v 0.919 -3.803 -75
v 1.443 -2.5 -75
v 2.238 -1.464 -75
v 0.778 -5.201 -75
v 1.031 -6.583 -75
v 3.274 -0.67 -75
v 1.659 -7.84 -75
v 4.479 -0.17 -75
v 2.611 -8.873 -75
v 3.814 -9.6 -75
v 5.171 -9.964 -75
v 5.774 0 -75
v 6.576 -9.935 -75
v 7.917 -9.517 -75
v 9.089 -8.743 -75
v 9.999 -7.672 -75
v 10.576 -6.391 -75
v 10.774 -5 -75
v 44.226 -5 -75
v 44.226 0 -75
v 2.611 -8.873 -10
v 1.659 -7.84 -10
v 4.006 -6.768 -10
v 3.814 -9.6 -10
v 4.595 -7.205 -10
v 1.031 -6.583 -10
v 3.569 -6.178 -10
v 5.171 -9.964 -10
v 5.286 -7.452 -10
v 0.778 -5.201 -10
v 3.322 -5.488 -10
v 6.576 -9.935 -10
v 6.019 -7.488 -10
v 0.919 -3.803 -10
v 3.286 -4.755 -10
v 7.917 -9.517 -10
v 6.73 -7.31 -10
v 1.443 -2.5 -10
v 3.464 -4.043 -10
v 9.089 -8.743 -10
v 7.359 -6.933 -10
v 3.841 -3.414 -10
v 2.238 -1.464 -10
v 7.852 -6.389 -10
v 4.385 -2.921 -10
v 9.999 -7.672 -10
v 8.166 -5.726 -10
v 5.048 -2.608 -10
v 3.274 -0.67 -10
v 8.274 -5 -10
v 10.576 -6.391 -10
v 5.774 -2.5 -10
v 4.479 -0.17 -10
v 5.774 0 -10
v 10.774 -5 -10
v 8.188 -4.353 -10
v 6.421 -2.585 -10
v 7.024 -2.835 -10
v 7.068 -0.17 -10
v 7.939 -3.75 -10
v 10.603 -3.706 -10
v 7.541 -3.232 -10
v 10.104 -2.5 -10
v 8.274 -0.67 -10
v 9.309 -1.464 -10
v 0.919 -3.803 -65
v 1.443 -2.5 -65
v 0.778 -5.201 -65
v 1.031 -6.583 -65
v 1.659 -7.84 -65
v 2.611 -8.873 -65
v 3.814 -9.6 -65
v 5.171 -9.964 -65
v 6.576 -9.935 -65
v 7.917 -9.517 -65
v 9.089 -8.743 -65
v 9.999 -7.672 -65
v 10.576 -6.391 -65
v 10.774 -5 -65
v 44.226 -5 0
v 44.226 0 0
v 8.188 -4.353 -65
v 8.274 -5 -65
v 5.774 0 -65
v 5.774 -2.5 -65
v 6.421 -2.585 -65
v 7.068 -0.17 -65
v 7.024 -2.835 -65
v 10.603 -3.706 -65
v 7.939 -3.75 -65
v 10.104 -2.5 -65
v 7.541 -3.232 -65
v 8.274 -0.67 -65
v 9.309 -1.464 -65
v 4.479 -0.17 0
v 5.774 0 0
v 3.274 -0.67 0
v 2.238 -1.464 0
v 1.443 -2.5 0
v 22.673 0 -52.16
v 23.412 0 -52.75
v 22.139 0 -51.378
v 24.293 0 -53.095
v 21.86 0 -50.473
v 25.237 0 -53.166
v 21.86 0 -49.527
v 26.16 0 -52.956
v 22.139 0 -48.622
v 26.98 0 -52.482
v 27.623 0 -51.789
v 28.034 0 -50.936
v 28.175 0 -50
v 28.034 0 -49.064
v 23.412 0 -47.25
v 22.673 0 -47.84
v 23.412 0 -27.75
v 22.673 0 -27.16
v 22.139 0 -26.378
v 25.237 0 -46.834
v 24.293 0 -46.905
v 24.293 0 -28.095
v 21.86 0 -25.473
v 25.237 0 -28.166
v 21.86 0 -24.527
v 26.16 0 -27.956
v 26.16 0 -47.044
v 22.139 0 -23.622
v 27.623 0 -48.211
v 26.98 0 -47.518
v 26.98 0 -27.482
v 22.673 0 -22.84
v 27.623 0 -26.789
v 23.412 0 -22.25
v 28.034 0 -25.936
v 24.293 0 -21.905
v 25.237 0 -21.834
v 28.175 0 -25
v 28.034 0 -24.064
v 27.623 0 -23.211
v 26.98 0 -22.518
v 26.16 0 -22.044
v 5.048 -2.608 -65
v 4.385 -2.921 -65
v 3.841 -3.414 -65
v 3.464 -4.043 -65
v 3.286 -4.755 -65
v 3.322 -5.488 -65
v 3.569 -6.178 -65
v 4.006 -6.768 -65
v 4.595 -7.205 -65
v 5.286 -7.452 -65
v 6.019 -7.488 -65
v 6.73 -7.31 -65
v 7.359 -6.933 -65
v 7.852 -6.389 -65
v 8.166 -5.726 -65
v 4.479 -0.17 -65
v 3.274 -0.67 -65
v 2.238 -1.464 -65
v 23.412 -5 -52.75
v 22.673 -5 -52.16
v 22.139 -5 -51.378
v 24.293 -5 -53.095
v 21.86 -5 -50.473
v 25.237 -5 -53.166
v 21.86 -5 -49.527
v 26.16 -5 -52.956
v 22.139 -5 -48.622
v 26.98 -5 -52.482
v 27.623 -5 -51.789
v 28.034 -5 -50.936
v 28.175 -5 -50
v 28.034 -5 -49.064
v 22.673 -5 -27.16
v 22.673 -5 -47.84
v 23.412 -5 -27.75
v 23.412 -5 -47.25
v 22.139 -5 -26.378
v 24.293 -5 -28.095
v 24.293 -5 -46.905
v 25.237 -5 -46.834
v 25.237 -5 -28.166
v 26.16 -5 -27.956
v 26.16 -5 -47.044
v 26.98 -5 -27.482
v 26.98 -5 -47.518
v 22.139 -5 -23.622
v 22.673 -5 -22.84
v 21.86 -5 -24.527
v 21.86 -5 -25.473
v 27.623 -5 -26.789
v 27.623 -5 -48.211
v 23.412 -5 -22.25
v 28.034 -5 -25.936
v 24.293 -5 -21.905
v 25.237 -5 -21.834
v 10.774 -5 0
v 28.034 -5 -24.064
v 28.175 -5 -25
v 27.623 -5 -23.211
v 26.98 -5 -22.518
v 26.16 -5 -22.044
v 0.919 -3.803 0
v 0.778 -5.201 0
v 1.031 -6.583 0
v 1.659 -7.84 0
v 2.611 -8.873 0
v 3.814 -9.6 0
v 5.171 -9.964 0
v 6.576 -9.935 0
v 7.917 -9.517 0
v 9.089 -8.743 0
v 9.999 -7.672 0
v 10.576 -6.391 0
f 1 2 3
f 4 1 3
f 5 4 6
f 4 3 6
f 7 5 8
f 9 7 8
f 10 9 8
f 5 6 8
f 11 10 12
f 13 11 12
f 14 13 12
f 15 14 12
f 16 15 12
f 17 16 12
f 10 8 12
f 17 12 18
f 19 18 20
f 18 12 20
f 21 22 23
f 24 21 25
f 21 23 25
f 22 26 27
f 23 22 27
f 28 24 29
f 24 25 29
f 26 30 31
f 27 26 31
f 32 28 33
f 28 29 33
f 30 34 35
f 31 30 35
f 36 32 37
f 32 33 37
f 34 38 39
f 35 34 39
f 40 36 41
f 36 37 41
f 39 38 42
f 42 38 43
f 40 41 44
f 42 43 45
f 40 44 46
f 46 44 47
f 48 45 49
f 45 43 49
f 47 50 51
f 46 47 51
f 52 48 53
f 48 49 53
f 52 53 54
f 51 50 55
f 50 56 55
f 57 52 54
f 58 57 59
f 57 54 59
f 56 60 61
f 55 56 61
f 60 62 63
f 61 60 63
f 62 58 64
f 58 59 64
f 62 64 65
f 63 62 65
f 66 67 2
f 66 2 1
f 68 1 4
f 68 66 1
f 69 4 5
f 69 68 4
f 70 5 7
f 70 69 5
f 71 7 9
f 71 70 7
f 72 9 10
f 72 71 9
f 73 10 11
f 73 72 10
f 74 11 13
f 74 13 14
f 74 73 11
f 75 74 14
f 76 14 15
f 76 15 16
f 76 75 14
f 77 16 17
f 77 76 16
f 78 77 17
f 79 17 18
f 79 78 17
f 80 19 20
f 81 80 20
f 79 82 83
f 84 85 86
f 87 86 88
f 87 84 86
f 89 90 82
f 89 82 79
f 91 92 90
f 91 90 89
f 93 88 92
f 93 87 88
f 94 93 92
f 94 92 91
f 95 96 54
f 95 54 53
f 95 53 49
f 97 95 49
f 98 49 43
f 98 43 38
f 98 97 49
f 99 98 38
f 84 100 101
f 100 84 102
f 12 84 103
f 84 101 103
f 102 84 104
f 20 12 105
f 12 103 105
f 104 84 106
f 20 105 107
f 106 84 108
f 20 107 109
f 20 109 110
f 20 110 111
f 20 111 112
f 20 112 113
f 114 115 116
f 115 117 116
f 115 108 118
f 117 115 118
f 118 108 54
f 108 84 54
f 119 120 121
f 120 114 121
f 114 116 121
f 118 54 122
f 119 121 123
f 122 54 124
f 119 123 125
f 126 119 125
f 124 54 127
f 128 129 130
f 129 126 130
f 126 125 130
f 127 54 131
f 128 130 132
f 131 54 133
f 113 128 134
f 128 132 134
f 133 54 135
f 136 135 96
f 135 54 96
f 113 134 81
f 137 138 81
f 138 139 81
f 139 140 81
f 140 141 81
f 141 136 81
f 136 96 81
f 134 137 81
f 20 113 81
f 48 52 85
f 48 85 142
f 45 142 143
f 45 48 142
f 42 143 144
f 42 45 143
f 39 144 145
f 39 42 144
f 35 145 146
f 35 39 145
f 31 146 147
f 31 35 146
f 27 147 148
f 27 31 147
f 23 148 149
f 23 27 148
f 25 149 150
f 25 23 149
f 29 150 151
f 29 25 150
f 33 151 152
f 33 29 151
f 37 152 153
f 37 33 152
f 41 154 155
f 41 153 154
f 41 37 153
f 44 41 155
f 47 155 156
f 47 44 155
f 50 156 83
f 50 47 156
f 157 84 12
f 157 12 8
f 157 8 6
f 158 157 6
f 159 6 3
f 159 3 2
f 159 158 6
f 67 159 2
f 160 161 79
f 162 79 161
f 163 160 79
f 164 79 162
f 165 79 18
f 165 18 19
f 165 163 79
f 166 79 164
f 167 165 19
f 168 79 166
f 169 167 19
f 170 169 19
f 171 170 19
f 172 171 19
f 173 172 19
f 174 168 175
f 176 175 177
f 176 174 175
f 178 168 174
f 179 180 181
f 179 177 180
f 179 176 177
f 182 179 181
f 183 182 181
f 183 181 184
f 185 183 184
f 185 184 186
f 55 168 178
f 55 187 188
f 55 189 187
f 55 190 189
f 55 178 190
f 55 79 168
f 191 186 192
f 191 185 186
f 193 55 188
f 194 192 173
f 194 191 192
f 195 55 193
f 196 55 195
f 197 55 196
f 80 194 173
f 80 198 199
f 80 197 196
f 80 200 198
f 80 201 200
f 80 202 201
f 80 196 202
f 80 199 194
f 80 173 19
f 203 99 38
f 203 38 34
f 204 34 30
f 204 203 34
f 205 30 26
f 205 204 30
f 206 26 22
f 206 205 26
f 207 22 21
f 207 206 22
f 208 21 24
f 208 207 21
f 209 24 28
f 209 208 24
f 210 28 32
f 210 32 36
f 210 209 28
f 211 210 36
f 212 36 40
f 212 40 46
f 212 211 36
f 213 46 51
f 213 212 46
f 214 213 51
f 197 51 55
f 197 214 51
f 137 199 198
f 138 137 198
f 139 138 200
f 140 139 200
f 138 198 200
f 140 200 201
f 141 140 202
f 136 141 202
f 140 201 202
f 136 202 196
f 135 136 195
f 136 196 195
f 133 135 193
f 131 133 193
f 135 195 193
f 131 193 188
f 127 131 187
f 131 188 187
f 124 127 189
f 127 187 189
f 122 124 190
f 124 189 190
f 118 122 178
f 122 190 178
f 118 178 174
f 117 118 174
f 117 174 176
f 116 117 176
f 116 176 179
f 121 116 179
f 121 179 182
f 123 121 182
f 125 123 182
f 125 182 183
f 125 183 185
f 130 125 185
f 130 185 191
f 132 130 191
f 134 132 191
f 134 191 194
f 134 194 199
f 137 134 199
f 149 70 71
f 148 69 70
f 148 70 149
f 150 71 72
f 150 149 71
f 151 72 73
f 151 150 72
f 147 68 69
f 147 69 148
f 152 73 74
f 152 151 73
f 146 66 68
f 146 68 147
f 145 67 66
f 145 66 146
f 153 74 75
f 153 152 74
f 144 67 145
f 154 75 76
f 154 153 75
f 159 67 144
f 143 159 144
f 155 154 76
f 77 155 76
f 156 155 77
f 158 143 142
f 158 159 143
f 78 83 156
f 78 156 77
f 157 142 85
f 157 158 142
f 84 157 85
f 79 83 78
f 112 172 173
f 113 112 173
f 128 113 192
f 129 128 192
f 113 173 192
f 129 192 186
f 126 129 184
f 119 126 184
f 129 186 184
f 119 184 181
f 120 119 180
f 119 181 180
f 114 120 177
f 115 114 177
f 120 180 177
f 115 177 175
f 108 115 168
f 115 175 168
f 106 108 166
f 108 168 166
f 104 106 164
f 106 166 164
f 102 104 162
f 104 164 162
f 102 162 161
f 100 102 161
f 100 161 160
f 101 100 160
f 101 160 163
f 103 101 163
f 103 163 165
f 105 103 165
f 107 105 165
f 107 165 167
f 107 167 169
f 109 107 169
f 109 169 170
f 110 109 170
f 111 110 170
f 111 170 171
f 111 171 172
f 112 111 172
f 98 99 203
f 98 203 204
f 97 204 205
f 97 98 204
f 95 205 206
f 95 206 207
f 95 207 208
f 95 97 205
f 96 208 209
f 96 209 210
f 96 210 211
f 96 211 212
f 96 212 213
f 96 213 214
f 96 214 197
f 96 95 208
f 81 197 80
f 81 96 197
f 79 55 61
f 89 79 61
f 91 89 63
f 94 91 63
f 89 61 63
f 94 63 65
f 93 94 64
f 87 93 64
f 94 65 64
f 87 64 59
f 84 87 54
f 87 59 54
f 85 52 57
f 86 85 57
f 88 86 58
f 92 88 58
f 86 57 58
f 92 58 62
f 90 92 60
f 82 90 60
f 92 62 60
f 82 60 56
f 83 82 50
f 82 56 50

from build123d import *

# Parameters (mm, degrees)
SKETCH1_W           = 38.452994616
SKETCH1_H           = 5
BOSS_EXTRUDE1_DEPTH = 75
BOSS_EXTRUDE2_DEPTH = 10
BOSS_EXTRUDE4_DEPTH = 75
BOSS_EXTRUDE5_START = -65
BOSS_EXTRUDE5_DEPTH = 10
CUT_EXTRUDE7_START  = -10
CUT_EXTRUDE7_DEPTH  = 55
SKETCH5_R           = 3.175
CUT_EXTRUDE8_DEPTH  = 55


with BuildPart() as part:
    # Sketch1 → Boss-Extrude1 (new body)
    with BuildSketch(Plane.XY):
        with Locations((25, -2.5)):
            Rectangle(SKETCH1_W, SKETCH1_H)
    extrude(amount=-BOSS_EXTRUDE1_DEPTH)

    # Sketch1<4> → Boss-Extrude2 (add)
    with BuildSketch(Plane.XY):
        with BuildLine():
            ThreePointArc((5.773502692, 0), (2.237968786, -8.535533906), (10.773502692, -5))
            Line((10.773502692, -5), (5.773502692, -5))
            Line((5.773502692, -5), (5.773502692, 0))
        make_face()
    extrude(amount=-BOSS_EXTRUDE2_DEPTH)

    # Sketch1<11> → Boss-Extrude4 (add)
    with BuildSketch(Plane.XY):
        with BuildLine():
            Line((5.773502692, -5), (5.773502692, -2.5))
            ThreePointArc((5.773502692, -2.5), (4.005735739, -6.767766953), (8.273502692, -5))
            Line((8.273502692, -5), (5.773502692, -5))
        make_face()
    extrude(amount=-BOSS_EXTRUDE4_DEPTH)

    # Sketch1<12> → Boss-Extrude5 (add)
    with BuildSketch(Plane.XY.offset(BOSS_EXTRUDE5_START)):
        with BuildLine():
            Line((5.773502692, -2.5), (5.773502692, 0))
            ThreePointArc((5.773502692, 0), (3.273502704, -0.669872974), (1.443375686, -2.499999977))
            ThreePointArc((1.443375686, -2.499999977), (4.479407453, -9.829629128), (10.773502692, -5))
            Line((10.773502692, -5), (8.273502692, -5))
            ThreePointArc((8.273502692, -5), (4.005735739, -6.767766953), (5.773502692, -2.5))
        make_face()
    extrude(amount=-BOSS_EXTRUDE5_DEPTH)

    # Sketch1<13> → Cut-Extrude7 (cut)
    with BuildSketch(Plane.XY.offset(CUT_EXTRUDE7_START)):
        with BuildLine():
            ThreePointArc((10.773502692, -5), (9.309036598, -1.464466094), (5.773502692, 0))
            Line((5.773502692, 0), (5.773502692, -2.5))
            ThreePointArc((5.773502692, -2.5), (7.541269645, -3.232233047), (8.273502692, -5))
            Line((8.273502692, -5), (10.773502692, -5))
        make_face()
    extrude(amount=-CUT_EXTRUDE7_DEPTH, mode=Mode.SUBTRACT)

    # Sketch5 → Cut-Extrude8 (cut)
    with BuildSketch(Plane.XZ.offset(5)):
        with Locations((25, -25)):
            Circle(SKETCH5_R)
        with Locations((25, -50)):
            Circle(SKETCH5_R)
    extrude(amount=-CUT_EXTRUDE8_DEPTH, mode=Mode.SUBTRACT)


solid = part.part
